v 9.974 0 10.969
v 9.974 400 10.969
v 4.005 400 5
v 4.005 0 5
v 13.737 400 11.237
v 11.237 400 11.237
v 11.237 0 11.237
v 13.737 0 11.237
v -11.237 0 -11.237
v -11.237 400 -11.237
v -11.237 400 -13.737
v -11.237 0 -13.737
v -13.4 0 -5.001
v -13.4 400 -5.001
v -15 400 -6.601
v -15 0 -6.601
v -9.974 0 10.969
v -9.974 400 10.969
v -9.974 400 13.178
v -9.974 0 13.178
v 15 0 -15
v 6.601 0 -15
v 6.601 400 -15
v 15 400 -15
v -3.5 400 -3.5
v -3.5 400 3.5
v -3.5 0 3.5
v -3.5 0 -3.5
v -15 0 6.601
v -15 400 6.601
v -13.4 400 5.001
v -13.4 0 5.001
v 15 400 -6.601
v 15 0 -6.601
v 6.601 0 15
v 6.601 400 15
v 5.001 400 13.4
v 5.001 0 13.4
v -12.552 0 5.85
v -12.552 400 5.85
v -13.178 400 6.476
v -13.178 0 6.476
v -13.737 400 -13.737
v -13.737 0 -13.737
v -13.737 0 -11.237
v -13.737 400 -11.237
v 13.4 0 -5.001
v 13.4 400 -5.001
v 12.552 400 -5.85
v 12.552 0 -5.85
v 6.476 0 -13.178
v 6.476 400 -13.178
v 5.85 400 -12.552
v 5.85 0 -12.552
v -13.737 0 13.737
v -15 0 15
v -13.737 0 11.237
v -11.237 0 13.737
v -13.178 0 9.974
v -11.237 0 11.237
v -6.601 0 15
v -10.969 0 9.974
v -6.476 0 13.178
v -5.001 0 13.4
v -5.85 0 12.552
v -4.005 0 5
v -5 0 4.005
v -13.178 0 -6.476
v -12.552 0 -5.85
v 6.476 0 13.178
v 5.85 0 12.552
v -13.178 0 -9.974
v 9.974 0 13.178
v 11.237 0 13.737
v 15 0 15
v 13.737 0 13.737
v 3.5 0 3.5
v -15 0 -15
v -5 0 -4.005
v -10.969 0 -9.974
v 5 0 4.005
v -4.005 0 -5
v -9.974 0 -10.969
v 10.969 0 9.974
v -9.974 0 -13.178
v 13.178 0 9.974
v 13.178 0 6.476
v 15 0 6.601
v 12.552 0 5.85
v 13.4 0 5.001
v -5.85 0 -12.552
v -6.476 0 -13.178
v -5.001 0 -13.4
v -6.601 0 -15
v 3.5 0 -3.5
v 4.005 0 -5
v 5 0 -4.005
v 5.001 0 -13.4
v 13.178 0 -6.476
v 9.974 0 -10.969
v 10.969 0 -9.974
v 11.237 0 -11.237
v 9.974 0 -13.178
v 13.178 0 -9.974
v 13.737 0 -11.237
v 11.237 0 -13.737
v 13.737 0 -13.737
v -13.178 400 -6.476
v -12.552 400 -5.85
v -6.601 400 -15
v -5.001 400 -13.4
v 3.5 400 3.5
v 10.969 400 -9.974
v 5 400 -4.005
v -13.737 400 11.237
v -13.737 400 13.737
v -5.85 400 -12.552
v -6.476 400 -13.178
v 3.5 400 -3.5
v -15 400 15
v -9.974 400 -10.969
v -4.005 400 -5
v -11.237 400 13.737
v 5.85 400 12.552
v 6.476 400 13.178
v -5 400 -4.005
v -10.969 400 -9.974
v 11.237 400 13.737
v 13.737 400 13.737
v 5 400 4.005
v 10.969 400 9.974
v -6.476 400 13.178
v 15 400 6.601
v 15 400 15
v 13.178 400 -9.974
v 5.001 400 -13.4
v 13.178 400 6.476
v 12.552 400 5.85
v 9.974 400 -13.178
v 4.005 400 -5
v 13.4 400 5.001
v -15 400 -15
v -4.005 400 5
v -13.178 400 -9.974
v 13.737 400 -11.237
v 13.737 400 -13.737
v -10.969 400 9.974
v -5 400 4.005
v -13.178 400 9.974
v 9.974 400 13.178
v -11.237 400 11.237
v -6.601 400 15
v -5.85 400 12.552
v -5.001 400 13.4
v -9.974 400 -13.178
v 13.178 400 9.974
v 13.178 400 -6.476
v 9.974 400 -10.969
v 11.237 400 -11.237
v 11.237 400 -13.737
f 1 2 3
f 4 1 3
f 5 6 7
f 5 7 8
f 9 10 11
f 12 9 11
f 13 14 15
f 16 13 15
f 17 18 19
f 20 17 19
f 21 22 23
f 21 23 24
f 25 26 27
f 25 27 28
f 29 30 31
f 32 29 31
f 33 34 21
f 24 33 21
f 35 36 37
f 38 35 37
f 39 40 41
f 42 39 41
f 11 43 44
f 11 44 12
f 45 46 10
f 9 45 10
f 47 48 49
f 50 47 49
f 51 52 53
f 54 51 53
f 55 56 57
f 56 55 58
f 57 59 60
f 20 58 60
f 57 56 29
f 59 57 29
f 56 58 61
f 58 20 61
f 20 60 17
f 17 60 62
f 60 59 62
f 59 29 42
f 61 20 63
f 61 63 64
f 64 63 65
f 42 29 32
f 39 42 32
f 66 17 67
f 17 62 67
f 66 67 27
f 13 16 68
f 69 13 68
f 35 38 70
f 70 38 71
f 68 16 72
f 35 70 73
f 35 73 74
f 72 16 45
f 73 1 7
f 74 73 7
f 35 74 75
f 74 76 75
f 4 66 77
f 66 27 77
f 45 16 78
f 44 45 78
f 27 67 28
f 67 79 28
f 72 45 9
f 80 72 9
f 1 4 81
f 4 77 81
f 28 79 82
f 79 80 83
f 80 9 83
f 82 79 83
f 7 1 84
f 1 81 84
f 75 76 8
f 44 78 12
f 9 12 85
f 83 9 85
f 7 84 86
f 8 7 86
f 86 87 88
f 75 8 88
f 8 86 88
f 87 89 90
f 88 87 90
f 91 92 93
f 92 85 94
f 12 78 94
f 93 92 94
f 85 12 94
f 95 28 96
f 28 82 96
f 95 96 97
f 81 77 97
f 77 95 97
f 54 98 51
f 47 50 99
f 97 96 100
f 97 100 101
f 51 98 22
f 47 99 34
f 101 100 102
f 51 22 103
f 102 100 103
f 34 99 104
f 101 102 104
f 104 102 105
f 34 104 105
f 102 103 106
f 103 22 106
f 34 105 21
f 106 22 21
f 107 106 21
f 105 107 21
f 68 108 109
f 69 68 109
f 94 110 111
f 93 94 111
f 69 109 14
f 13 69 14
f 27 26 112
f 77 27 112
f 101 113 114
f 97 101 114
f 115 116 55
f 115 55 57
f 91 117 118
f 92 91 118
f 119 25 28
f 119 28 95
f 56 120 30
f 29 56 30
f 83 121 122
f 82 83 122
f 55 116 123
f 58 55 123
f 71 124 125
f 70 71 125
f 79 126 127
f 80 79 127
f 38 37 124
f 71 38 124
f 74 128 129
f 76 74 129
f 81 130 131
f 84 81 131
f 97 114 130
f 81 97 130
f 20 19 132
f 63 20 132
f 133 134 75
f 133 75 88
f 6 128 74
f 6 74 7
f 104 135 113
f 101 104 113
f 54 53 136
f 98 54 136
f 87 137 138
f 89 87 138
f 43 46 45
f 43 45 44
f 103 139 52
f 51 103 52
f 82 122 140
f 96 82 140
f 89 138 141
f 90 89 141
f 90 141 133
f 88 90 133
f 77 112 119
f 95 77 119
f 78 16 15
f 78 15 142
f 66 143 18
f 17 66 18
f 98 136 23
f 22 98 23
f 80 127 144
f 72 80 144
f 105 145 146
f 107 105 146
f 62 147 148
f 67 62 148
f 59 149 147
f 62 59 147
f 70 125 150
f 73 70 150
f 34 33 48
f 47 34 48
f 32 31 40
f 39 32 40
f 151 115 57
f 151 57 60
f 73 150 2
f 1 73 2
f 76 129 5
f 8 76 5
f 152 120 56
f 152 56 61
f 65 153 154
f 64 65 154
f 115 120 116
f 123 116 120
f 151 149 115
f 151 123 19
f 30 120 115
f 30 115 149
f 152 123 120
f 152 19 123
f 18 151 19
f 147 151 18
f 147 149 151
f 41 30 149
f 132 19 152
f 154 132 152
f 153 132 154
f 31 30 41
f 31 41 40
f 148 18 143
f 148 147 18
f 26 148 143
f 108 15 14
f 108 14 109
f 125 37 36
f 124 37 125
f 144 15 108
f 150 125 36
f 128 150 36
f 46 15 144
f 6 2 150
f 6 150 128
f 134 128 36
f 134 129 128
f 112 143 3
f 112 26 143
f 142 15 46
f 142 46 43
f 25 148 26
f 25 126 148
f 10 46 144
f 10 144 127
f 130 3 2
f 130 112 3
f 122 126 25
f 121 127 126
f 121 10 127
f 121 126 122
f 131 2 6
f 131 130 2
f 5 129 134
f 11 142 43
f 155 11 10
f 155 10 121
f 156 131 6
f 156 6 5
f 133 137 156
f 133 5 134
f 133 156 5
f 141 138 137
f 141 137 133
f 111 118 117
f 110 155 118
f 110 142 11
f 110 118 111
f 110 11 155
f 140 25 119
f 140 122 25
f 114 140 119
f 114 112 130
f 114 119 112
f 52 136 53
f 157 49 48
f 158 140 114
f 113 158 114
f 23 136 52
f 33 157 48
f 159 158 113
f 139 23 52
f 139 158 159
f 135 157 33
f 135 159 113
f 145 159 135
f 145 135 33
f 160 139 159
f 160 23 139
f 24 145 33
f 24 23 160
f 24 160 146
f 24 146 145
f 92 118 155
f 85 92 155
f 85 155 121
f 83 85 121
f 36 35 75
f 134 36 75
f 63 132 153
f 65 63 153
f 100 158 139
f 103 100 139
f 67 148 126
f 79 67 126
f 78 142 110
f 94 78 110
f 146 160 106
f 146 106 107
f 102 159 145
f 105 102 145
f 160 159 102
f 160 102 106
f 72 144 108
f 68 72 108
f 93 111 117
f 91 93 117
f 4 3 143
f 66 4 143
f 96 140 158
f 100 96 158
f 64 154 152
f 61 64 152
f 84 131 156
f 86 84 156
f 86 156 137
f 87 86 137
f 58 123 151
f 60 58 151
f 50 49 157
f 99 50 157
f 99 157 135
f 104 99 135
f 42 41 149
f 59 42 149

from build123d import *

# Parameters (mm, degrees)
SKETCH_1_W          = 30
SKETCH_1_H          = 30
EXTRUDE_1_DEPTH     = 400
CUT_EXTRUDE_1_DEPTH = 400
SKETCH_3_W          = 7
SKETCH_3_H          = 7
SKETCH_3_W_2        = 2.5
SKETCH_3_H_2        = 2.5
CUT_EXTRUDE_2_DEPTH = 400


with BuildPart() as part:
    # 草图1 → 凸台-拉伸1 (new body)
    with BuildSketch(Plane(origin=(0, 0, 0), x_dir=(1, 0, 0), z_dir=(0, 1, 0))):
        Rectangle(SKETCH_1_W, SKETCH_1_H)
    extrude(amount=EXTRUDE_1_DEPTH)

    # 草图2 → 切除-拉伸1 (cut)
    with BuildSketch(Plane(origin=(0, 400, 0), x_dir=(1, 0, 0), z_dir=(0, 1, 0))):
        Polygon((-4.004617846, 5), (4.004617846, 5), (9.97363434, 10.969016494), (9.97363434, 13.177944766), (6.476155555, 13.177944766), (5.84989743, 12.551686641), (5.001284858, 13.400299213), (6.600985645, 15), (-6.600985645, 15), (-5.001284858, 13.400299213), (-5.84989743, 12.551686641), (-6.476155555, 13.177944766), (-9.97363434, 13.177944766), (-9.97363434, 10.969016494), align=None)
        Polygon((10.969016494, 9.97363434), (5, 4.004617846), (5, -4.004617846), (10.969016494, -9.97363434), (13.177944766, -9.97363434), (13.177944766, -6.476155555), (12.551686641, -5.84989743), (13.400299213, -5.001284858), (15, -6.600985645), (15, 6.600985645), (13.400299213, 5.001284858), (12.551686641, 5.84989743), (13.177944766, 6.476155555), (13.177944766, 9.97363434), align=None)
        Polygon((-5, -4.004617846), (-5, 4.004617846), (-10.969016494, 9.97363434), (-13.177944766, 9.97363434), (-13.177944766, 6.476155555), (-12.551686641, 5.84989743), (-13.400299213, 5.001284858), (-15, 6.600985645), (-15, -6.600985645), (-13.400299213, -5.001284858), (-12.551686641, -5.84989743), (-13.177944766, -6.476155555), (-13.177944766, -9.97363434), (-10.969016494, -9.97363434), align=None)
        Polygon((9.97363434, -10.969016494), (4.004617846, -5), (-4.004617846, -5), (-9.97363434, -10.969016494), (-9.97363434, -13.177944766), (-6.476155555, -13.177944766), (-5.84989743, -12.551686641), (-5.001284858, -13.400299213), (-6.600985645, -15), (6.600985645, -15), (5.001284858, -13.400299213), (5.84989743, -12.551686641), (6.476155555, -13.177944766), (9.97363434, -13.177944766), align=None)
    extrude(amount=-CUT_EXTRUDE_1_DEPTH, mode=Mode.SUBTRACT)

    # 草图3 → 切除-拉伸2 (cut)
    with BuildSketch(Plane(origin=(0, 400, 0), x_dir=(1, 0, 0), z_dir=(0, 1, 0))):
        Rectangle(SKETCH_3_W, SKETCH_3_H)
        with Locations((12.48681717, -12.48681717)):
            Rectangle(SKETCH_3_W_2, SKETCH_3_H_2)
        with Locations((12.48681717, 12.48681717)):
            Rectangle(SKETCH_3_W_2, SKETCH_3_H_2)
        with Locations((-12.48681717, -12.48681717)):
            Rectangle(SKETCH_3_W_2, SKETCH_3_H_2)
        with Locations((-12.48681717, 12.48681717)):
            Rectangle(SKETCH_3_W_2, SKETCH_3_H_2)
    extrude(amount=-CUT_EXTRUDE_2_DEPTH, mode=Mode.SUBTRACT)


solid = part.part
